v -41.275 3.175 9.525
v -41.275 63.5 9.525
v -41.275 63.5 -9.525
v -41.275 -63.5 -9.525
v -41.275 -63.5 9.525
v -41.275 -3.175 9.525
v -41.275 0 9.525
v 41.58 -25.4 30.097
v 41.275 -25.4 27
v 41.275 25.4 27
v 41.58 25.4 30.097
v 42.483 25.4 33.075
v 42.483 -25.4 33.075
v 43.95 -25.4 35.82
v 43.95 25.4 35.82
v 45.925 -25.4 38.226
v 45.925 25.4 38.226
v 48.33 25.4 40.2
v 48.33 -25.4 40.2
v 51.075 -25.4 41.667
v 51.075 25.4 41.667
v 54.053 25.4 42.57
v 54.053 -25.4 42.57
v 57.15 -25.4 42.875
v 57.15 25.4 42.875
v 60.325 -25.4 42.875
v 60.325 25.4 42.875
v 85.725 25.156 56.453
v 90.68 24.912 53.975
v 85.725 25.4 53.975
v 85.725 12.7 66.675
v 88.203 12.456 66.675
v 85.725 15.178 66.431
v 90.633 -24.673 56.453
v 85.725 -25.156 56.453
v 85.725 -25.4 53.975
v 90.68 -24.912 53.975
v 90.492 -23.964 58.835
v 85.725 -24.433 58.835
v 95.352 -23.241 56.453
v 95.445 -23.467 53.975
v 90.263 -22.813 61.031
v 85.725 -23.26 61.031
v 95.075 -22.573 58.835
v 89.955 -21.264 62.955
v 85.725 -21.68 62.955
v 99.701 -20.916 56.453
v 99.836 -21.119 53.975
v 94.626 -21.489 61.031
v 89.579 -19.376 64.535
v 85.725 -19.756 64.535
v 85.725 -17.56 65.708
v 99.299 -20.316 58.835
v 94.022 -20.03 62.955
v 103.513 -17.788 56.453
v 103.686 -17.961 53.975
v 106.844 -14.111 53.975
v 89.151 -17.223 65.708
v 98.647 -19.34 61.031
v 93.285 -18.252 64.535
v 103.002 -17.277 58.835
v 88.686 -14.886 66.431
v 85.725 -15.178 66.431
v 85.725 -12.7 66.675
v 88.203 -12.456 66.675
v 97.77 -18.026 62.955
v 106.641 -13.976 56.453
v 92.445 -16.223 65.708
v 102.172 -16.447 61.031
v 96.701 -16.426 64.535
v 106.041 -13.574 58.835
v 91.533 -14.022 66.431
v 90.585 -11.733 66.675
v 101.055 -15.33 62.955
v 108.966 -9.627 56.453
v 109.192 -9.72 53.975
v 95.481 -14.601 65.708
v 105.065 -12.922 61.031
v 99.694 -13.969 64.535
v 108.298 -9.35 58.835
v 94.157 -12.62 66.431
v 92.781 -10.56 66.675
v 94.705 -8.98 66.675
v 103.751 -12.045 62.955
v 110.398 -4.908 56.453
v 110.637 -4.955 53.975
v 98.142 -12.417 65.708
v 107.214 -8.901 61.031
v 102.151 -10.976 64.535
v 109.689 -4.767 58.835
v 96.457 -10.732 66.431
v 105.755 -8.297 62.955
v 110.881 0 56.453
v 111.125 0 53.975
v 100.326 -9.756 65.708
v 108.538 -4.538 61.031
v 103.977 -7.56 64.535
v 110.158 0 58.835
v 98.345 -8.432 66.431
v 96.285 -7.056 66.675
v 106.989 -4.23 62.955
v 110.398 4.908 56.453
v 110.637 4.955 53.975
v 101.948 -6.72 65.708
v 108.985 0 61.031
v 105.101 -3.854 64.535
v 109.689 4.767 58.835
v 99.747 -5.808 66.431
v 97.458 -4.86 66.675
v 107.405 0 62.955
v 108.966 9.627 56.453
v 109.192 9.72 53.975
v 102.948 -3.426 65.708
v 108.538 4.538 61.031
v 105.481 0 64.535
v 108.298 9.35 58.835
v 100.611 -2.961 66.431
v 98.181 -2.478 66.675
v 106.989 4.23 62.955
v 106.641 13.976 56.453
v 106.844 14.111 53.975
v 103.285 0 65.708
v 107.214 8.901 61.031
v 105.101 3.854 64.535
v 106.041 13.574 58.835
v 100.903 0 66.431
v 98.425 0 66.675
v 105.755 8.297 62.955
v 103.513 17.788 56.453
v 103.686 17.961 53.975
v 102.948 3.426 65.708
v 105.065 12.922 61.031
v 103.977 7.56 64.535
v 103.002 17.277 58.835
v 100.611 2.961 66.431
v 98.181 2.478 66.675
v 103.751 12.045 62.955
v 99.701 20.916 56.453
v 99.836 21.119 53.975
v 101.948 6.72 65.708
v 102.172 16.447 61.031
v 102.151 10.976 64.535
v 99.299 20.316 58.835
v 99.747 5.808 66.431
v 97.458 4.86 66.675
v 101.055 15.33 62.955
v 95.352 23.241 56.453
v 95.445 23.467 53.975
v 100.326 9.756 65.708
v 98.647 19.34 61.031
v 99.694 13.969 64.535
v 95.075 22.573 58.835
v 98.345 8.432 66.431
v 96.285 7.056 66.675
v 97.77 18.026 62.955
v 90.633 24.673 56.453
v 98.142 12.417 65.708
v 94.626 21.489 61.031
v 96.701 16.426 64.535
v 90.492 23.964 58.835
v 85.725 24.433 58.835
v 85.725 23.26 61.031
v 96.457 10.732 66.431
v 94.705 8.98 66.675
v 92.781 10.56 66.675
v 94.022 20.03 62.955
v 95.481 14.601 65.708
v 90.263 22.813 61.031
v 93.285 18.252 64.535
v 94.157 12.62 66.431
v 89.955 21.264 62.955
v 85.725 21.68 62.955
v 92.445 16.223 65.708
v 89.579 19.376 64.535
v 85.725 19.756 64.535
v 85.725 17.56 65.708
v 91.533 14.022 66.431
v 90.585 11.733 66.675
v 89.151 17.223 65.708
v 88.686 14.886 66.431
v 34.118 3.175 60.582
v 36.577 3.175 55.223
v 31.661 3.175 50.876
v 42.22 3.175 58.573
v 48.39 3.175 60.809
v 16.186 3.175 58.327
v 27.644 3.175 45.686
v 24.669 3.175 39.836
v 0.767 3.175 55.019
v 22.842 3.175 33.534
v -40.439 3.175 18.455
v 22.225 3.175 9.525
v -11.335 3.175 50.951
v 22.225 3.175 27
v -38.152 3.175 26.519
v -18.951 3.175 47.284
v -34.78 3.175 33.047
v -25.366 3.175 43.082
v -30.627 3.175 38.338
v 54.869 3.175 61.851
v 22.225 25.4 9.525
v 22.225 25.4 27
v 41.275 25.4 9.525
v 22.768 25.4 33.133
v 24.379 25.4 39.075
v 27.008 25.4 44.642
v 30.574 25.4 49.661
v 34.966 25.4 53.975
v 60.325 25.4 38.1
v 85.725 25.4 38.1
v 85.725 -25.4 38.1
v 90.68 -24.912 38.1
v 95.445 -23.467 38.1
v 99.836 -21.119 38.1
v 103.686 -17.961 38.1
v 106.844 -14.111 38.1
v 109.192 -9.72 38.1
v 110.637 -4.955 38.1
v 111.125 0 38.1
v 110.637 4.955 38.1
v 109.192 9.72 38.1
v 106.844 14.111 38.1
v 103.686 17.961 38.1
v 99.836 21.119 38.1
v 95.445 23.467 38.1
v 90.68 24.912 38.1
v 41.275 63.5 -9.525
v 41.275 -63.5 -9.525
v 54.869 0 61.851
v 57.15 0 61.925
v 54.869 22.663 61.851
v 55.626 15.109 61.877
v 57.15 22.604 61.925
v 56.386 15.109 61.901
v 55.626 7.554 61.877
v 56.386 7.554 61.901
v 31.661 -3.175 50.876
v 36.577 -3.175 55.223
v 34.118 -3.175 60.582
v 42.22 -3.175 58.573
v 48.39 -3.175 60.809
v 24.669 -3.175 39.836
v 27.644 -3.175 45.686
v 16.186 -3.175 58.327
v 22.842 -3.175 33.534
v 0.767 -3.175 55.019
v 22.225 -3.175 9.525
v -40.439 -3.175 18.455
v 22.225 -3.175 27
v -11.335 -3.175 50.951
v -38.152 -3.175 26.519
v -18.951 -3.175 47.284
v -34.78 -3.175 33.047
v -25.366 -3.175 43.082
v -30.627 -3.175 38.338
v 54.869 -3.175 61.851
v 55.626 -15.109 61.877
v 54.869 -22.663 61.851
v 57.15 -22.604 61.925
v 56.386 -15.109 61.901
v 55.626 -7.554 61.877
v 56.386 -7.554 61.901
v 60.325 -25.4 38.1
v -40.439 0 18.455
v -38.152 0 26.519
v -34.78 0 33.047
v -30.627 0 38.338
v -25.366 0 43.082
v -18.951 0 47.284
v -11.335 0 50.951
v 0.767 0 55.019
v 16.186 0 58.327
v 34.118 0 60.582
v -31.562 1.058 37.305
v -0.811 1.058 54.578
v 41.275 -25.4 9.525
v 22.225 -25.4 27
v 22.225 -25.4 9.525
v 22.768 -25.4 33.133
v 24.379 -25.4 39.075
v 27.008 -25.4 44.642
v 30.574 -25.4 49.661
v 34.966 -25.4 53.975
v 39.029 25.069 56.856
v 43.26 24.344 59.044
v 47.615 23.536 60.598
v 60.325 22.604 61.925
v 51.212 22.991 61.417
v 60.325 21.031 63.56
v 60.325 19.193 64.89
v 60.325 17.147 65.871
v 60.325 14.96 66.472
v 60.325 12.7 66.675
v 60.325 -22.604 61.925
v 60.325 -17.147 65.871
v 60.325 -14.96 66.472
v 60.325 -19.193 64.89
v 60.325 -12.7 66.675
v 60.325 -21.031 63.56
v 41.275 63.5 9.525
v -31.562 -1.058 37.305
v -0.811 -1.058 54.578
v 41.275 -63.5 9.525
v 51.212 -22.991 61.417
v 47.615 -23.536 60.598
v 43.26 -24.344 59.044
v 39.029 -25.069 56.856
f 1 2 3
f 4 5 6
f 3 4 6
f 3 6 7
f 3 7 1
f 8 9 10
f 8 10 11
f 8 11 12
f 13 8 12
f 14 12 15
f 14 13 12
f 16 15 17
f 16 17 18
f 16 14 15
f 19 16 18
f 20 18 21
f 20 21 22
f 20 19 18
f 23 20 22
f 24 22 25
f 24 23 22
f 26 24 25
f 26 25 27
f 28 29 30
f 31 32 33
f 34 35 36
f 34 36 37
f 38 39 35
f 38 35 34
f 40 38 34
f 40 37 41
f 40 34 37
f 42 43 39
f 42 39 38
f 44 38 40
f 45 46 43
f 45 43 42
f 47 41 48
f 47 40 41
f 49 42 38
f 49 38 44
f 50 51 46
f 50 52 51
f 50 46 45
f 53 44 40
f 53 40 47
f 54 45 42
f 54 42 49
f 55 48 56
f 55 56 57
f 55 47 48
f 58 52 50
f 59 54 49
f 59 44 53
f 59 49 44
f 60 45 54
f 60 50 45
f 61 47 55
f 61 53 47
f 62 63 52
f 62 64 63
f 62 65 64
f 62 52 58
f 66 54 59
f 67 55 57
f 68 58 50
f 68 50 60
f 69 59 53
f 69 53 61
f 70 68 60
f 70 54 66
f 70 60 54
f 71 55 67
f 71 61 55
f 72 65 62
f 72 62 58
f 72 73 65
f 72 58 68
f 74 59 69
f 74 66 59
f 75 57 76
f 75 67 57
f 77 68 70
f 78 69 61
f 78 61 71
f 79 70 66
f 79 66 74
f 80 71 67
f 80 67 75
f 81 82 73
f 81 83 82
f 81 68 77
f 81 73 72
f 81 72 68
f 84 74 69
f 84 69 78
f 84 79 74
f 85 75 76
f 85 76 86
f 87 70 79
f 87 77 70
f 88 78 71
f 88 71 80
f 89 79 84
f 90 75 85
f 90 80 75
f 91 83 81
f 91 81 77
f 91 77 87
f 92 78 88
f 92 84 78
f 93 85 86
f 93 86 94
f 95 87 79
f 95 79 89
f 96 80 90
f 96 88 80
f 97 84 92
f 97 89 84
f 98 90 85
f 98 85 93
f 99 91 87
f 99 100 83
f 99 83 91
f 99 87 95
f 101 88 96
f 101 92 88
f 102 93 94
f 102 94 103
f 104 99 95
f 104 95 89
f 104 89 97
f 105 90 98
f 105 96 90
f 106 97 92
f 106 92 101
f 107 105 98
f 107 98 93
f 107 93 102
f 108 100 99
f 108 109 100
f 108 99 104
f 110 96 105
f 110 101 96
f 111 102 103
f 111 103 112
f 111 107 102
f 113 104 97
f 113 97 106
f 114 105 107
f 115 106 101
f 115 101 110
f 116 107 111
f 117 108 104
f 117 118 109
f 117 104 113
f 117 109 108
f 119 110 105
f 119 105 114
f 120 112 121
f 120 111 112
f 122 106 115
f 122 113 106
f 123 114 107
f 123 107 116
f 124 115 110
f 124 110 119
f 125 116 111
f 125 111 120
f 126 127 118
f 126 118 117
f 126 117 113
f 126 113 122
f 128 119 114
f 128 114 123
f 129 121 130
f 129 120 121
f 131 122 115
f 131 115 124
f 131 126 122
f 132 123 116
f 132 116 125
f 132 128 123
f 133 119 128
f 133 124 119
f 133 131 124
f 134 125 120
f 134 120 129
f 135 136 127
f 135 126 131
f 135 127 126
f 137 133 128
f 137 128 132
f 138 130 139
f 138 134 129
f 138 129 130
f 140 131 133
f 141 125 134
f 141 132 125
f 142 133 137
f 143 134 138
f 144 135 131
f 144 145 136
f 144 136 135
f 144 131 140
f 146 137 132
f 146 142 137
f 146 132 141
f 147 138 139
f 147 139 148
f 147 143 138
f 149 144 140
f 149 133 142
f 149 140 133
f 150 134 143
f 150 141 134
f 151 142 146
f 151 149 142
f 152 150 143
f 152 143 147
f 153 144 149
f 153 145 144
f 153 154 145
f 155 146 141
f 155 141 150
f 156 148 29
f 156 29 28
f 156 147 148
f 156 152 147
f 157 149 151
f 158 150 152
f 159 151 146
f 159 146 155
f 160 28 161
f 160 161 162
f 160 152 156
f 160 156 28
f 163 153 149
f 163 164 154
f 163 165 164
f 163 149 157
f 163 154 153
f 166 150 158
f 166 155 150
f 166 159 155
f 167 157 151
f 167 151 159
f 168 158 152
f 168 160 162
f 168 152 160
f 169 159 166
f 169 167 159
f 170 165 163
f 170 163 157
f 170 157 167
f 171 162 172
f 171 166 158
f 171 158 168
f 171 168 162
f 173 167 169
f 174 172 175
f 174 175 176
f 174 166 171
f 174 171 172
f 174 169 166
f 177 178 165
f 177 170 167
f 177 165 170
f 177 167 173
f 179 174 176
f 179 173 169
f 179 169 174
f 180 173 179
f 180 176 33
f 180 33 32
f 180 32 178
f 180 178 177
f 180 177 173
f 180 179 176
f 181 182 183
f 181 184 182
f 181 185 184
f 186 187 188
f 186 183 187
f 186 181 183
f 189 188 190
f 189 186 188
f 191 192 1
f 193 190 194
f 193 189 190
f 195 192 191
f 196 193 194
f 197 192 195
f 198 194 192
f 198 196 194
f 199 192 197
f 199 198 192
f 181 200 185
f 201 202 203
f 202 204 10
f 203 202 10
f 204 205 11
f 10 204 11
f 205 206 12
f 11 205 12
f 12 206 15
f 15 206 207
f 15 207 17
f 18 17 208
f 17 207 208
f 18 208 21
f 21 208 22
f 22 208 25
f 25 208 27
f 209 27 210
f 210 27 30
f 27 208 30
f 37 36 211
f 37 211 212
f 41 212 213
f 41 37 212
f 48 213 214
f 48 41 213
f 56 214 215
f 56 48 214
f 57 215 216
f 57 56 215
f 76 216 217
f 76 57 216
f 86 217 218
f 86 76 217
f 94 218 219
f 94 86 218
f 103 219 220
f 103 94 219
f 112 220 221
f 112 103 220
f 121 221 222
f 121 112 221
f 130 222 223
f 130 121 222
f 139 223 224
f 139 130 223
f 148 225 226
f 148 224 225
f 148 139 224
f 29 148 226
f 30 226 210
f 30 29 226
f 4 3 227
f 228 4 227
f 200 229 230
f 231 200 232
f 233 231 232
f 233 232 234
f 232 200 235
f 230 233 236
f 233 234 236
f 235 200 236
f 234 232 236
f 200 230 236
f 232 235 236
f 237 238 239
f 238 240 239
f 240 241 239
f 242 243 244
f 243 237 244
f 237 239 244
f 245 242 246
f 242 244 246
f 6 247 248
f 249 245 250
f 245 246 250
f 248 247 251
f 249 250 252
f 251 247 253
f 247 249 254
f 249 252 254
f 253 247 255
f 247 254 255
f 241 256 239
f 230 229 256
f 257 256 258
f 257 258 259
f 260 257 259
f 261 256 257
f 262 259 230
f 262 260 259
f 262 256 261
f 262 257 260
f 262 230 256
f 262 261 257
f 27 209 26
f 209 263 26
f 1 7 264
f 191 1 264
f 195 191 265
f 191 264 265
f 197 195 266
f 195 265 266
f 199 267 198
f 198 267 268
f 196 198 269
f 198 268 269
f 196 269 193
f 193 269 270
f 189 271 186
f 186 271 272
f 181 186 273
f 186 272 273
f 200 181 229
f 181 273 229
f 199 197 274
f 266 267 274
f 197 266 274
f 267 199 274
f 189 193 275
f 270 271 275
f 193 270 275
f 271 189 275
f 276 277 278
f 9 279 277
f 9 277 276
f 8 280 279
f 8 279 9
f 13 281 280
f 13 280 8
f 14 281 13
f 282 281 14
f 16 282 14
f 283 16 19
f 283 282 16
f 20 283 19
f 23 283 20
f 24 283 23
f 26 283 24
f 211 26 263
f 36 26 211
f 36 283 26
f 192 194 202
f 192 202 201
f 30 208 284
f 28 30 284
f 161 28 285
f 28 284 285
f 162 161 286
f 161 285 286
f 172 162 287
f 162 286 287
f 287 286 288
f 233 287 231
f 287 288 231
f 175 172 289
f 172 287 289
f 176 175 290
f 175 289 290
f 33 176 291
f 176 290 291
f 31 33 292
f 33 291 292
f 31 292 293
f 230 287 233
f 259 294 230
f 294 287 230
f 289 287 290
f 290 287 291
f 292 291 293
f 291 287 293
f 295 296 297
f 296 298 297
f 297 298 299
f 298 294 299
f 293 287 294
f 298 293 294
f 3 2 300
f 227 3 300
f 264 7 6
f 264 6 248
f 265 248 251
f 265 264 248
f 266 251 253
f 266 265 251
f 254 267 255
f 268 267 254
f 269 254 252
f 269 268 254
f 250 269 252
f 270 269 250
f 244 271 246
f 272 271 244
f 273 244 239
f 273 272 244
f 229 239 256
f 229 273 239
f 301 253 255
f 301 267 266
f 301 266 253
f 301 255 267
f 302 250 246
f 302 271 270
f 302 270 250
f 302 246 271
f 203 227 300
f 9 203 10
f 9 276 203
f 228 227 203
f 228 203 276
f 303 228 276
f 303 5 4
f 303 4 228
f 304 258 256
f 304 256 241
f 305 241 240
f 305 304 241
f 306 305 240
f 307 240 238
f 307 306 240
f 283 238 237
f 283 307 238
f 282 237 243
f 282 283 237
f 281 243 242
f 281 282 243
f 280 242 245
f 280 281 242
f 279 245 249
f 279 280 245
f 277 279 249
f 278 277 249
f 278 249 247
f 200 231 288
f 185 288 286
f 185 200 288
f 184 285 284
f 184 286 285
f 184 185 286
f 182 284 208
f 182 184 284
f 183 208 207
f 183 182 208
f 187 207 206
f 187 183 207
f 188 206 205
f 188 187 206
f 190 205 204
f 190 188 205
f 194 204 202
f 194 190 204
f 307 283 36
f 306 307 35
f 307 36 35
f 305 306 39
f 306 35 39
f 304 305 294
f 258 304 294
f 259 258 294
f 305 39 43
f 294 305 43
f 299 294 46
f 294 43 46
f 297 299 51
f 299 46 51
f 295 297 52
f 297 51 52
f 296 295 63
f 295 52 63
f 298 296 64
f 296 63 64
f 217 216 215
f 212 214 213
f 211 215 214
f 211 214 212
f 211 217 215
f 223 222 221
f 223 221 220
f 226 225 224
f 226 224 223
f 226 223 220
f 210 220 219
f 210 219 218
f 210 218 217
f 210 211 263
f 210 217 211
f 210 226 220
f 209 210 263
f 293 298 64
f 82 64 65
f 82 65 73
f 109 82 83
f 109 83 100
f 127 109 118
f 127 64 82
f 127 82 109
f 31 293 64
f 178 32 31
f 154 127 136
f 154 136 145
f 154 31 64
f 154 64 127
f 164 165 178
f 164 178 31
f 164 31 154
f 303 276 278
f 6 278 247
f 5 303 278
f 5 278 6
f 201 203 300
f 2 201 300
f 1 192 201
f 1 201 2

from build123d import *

# Parameters (mm, degrees)
F1_DEPTH = 63.5
F0_W     = 25.4
F0_H     = 19.05
F0_H_2   = 4.7498
F0_H_3   = 4.7752
F2_DEPTH = 25.4
F4_DEPTH = 3.175
F5_R     = 12.7


with BuildPart() as f1:
    # F0 (on Front) → F1 (new body, symmetric)
    with BuildSketch(Plane.XZ):
        Polygon((-41.275, 9.525), (-41.275, -9.525), (41.275, -9.525), (41.275, 9.525), (22.225, 9.525), align=None)
    extrude(amount=F1_DEPTH, both=True)

    # F0 (on Front) → F2 (join, symmetric)
    with BuildSketch(Plane.XZ):
        with BuildLine():
            Line((22.225, 9.525), (41.275, 9.525))
            Line((41.275, 9.525), (41.275, 27.0002))
            ThreePointArc((41.275, 27.0002), (45.9246798487, 38.2255201513), (57.15, 42.8752))
            Line((57.15, 42.8752), (60.325, 42.8752))
            Line((60.325, 42.8752), (60.325, 61.9252))
            Line((60.325, 61.9252), (57.15, 61.9252))
            add(Edge.make_bspline(
                [(54.8690383613, 61.8506352771), (55.6242381587, 61.8771737888), (56.3845511944, 61.9020277216), (57.15, 61.9252)],
                knots=[110.3049530316, 110.3049530316, 110.3049530316, 110.3049530316, 111.5045361635, 111.5045361635, 111.5045361635, 111.5045361635], degree=3))
            ThreePointArc((54.8690383613, 61.8506352771), (31.6606079885, 50.8758470045), (22.225, 27.0002))
            Line((22.225, 27.0002), (22.225, 9.525))
        make_face()
        with Locations((73.025, 52.4002)):
            Rectangle(F0_W, F0_H)
        with Locations((73.025, 64.3001)):
            Rectangle(F0_W, F0_H_2)
        with Locations((73.025, 40.4876)):
            Rectangle(F0_W, F0_H_3)
    extrude(amount=F2_DEPTH, both=True)

    # F0 (on Front) → F3 (revolve)
    with BuildSketch(Plane.XZ):
        Polygon((85.725, 66.675), (85.725, 61.9252), (85.725, 42.8752), (85.725, 38.1), (111.125, 38.1), (111.125, 66.675), align=None)
    revolve(axis=Axis((85.725, 0, 52.3875), (0, 0, 1)))

    # F0 (on Front) → F4 (join, symmetric)
    with BuildSketch(Plane.XZ):
        with BuildLine():
            add(Edge.make_bspline(
                [(-41.275, 9.525), (-40.782344334, 42.7264267902), (-14.5736504872, 59.4103464678), (54.8690383613, 61.8506352771)],
                knots=[0, 0, 0, 0, 110.3049530316, 110.3049530316, 110.3049530316, 110.3049530316], degree=3))
            Line((-41.275, 9.525), (22.225, 9.525))
            Line((22.225, 9.525), (22.225, 27.0002))
            ThreePointArc((22.225, 27.0002), (31.6606079885, 50.8758470045), (54.8690383613, 61.8506352771))
        make_face()
    extrude(amount=F4_DEPTH, both=True)

    # F5
    f5_edges = [f1.edges().sort_by_distance(p)[0] for p in [
        (85.725, 25.4, 52.3875),
        (73.025, -25.4, 66.675),
        (73.025, 25.4, 66.675),
        (111.125, 0, 66.675),
    ]]
    fillet(f5_edges, radius=F5_R)


solid = f1.part
